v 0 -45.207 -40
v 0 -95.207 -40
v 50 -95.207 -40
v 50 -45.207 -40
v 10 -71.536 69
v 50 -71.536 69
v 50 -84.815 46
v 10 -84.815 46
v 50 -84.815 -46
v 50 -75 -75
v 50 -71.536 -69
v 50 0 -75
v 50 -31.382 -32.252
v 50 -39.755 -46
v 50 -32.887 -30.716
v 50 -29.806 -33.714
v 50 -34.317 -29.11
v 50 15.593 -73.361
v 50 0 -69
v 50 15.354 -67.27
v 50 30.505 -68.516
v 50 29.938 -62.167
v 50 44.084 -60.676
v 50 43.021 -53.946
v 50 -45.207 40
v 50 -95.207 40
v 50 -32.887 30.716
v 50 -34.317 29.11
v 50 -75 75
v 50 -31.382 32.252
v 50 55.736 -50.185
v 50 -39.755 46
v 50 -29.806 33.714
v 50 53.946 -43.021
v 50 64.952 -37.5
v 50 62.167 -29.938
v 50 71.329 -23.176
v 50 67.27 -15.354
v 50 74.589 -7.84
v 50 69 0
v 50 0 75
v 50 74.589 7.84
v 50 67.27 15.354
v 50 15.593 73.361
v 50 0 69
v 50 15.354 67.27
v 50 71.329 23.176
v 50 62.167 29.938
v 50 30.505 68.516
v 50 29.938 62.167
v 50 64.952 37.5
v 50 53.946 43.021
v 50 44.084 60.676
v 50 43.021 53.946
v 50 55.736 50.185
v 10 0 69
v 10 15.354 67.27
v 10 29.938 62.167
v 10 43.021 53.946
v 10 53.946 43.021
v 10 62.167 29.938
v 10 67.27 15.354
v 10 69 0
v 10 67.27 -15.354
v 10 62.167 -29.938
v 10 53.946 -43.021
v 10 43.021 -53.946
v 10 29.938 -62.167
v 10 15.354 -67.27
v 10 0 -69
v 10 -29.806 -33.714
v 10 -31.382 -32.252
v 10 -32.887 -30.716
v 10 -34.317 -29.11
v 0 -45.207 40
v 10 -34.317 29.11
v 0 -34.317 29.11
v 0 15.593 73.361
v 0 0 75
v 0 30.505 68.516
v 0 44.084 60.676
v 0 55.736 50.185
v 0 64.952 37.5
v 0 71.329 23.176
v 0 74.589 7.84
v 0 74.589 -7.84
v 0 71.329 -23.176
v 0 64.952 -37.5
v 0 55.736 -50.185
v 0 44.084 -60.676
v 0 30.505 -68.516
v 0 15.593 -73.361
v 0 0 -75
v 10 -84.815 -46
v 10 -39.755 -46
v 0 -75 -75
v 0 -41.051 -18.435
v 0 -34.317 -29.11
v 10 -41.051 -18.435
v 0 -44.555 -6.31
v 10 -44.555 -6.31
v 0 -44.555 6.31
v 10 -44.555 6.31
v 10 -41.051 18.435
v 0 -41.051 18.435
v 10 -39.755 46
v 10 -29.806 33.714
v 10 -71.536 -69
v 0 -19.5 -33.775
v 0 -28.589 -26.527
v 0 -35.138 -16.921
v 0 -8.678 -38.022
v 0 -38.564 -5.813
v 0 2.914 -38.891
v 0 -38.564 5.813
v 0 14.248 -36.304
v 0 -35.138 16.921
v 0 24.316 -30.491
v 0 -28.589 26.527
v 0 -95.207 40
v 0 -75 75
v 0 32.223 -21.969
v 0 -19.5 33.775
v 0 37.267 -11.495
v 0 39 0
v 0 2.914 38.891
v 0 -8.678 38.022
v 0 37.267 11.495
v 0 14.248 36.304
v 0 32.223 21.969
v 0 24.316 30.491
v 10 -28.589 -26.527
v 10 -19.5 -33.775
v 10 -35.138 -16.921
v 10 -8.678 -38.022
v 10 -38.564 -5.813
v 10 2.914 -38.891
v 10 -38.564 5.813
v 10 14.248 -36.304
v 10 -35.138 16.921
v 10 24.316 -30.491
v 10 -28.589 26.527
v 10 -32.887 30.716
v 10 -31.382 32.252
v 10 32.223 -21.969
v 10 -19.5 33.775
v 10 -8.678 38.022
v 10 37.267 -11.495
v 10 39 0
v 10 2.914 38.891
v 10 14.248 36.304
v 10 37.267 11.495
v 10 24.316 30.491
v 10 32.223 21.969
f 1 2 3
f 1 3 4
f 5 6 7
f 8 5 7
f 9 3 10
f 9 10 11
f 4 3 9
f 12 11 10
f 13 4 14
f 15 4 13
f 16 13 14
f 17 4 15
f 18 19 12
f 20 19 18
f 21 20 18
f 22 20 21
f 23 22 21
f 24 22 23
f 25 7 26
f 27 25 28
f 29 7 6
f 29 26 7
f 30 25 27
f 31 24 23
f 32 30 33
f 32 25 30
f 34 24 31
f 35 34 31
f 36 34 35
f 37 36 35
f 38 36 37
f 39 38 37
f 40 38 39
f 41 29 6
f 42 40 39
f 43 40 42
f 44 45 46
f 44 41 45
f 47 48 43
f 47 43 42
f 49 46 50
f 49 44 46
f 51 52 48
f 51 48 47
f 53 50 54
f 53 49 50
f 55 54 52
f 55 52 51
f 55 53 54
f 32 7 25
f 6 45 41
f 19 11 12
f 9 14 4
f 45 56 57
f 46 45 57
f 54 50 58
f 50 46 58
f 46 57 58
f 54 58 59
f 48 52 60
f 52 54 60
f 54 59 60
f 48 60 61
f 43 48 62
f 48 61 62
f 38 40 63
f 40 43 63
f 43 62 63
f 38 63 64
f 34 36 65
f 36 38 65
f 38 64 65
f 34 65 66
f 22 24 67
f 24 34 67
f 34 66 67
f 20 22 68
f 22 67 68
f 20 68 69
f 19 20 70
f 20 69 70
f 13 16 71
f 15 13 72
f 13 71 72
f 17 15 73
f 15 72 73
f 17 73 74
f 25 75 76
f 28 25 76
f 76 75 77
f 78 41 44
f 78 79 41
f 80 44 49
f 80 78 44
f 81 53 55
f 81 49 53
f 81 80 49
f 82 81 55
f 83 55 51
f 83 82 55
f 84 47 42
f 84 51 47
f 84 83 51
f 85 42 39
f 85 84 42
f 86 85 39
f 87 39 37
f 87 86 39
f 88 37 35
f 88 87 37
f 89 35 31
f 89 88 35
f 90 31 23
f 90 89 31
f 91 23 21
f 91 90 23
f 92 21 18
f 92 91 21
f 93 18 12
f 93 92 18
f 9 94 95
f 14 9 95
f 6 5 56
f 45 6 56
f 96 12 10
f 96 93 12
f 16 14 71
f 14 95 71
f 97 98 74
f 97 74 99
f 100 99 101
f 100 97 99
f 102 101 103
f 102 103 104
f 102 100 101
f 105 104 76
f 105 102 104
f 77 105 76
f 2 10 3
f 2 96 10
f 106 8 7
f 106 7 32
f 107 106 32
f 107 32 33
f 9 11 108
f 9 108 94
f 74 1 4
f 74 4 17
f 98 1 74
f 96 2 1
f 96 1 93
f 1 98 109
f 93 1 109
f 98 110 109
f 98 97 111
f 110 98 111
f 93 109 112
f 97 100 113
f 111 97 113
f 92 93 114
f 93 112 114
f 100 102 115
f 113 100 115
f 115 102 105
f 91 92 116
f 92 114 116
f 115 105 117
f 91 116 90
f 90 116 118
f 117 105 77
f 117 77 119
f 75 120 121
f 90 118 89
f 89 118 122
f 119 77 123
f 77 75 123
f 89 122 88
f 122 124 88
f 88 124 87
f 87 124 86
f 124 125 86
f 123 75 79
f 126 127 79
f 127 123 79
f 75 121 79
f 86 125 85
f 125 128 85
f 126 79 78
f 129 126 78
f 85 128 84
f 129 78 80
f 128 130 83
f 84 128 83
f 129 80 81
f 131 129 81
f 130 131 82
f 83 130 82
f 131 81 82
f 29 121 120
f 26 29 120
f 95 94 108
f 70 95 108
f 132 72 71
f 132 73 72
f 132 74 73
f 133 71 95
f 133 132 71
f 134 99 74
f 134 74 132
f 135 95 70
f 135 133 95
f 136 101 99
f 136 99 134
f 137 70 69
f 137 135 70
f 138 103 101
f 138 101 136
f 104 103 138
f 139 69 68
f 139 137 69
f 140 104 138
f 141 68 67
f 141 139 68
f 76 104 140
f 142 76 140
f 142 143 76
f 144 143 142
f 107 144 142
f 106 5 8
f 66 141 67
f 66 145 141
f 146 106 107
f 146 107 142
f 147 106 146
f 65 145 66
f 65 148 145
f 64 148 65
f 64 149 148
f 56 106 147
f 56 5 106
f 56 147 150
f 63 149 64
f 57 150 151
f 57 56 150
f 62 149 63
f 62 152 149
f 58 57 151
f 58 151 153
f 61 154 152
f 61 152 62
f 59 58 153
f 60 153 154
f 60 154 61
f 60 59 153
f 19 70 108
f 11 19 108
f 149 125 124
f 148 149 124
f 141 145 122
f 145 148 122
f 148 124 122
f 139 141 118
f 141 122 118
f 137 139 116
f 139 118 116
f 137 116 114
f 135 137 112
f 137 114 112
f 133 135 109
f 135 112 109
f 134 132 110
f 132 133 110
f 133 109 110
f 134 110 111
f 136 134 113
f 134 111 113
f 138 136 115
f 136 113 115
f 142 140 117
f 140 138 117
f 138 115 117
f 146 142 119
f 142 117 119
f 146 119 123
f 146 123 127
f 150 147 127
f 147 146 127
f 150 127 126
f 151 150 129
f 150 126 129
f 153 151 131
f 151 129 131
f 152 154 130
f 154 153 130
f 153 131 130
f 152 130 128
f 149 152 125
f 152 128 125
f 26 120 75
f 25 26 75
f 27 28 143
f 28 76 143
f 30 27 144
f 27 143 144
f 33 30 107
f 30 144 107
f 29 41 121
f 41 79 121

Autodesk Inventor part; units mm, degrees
ref_plane "YZ Plane" through (0, 0, 0) normal (1, 0, 0) x (0, 1, 0)
ref_plane "XZ Plane" through (0, 0, 0) normal (0, 1, 0) x (-1, 0, 0)
ref_plane "XY Plane" through (0, 0, 0) normal (0, 0, 1) x (1, 0, 0)
sketch "Sketch1" plane through (0, 0, 0) normal (1, 0, 0) x (0, 1, 0)
  arc A0 (0, -75) -> (0, 75) centre (0, 0) ccw
  line L0 (0, 75) -> (-75, 75)
  line L1 (0, -75) -> (-75, -75)
  line L2 (-75, 75) -> (-95.2073, 40)
  line L3 (-75, 75) -> (-34.5855, 75) construction
  circle A1 centre (0, 0) radius 45
  line L4 (-95.2073, 40) -> (-45.2073, 40)
  line L5 (-45.2073, 40) -> (-34.3167, 29.1095)
  line L6 (-45.2073, 40) -> (-29.8057, 40) construction
  line L7 (91.7333, 0) -> (-104.2658, 0) construction
  line L8 (-95.2073, -40) -> (-45.2073, -40)
  line L9 (-45.2073, -40) -> (-34.3167, -29.1095)
  line L10 (-45.2073, -40) -> (-29.8057, -40) construction
  line L11 (-75, -75) -> (-95.2073, -40)
  circle A2 centre (0, 0) radius 39
  line L12 (-71.5359, 69) -> (0, 69)
  arc A3 (0, -69) -> (0, 69) centre (0, 0) ccw
  line L13 (0, -69) -> (-71.5359, -69)
  line L14 (-71.5359, 69) -> (-84.815, 46)
  line L15 (-84.815, 46) -> (-39.7549, 46)
  line L16 (-39.7549, 46) -> (-29.8057, 33.7138)
  line L17 (-71.5359, -69) -> (-84.815, -46)
  line L18 (-84.815, -46) -> (-39.7549, -46)
  line L19 (-39.7549, -46) -> (-29.8057, -33.7138)
  dimension "d0" = 150
  dimension "d2" = 75
  dimension "d3" = 120
  dimension "d4" = 35
  dimension "d9" = 30
  dimension "d10" = 50
  dimension "d11" = 45
  dimension "d12" = 60
  dimension "d13" = 40
  dimension "d14" = 3.6821
  dimension "d15" = 68.5473
  dimension "d16" = 70.045
  dimension "d17" = 6
  dimension "d18" = 6
  dimension "d19" = 6
  dimension "d20" = 6
  dimension "d21" = 6
  dimension "d22" = 15.8094
extrude "Extrusion3" add sketch "Sketch1" along normal blind 50 contours L1 L11 L8 L9 A1 L19 L18 L17 L13 A3 L12 L14 L15 L16 L5 L4 L2 L0 A0
extrude "Extrusion4" add sketch "Sketch1" along normal blind 10 contours A1 | A1 L16 L15 L14 L12 A3 L13 L17 L18 L19
properties part number "Brazo 3D"
